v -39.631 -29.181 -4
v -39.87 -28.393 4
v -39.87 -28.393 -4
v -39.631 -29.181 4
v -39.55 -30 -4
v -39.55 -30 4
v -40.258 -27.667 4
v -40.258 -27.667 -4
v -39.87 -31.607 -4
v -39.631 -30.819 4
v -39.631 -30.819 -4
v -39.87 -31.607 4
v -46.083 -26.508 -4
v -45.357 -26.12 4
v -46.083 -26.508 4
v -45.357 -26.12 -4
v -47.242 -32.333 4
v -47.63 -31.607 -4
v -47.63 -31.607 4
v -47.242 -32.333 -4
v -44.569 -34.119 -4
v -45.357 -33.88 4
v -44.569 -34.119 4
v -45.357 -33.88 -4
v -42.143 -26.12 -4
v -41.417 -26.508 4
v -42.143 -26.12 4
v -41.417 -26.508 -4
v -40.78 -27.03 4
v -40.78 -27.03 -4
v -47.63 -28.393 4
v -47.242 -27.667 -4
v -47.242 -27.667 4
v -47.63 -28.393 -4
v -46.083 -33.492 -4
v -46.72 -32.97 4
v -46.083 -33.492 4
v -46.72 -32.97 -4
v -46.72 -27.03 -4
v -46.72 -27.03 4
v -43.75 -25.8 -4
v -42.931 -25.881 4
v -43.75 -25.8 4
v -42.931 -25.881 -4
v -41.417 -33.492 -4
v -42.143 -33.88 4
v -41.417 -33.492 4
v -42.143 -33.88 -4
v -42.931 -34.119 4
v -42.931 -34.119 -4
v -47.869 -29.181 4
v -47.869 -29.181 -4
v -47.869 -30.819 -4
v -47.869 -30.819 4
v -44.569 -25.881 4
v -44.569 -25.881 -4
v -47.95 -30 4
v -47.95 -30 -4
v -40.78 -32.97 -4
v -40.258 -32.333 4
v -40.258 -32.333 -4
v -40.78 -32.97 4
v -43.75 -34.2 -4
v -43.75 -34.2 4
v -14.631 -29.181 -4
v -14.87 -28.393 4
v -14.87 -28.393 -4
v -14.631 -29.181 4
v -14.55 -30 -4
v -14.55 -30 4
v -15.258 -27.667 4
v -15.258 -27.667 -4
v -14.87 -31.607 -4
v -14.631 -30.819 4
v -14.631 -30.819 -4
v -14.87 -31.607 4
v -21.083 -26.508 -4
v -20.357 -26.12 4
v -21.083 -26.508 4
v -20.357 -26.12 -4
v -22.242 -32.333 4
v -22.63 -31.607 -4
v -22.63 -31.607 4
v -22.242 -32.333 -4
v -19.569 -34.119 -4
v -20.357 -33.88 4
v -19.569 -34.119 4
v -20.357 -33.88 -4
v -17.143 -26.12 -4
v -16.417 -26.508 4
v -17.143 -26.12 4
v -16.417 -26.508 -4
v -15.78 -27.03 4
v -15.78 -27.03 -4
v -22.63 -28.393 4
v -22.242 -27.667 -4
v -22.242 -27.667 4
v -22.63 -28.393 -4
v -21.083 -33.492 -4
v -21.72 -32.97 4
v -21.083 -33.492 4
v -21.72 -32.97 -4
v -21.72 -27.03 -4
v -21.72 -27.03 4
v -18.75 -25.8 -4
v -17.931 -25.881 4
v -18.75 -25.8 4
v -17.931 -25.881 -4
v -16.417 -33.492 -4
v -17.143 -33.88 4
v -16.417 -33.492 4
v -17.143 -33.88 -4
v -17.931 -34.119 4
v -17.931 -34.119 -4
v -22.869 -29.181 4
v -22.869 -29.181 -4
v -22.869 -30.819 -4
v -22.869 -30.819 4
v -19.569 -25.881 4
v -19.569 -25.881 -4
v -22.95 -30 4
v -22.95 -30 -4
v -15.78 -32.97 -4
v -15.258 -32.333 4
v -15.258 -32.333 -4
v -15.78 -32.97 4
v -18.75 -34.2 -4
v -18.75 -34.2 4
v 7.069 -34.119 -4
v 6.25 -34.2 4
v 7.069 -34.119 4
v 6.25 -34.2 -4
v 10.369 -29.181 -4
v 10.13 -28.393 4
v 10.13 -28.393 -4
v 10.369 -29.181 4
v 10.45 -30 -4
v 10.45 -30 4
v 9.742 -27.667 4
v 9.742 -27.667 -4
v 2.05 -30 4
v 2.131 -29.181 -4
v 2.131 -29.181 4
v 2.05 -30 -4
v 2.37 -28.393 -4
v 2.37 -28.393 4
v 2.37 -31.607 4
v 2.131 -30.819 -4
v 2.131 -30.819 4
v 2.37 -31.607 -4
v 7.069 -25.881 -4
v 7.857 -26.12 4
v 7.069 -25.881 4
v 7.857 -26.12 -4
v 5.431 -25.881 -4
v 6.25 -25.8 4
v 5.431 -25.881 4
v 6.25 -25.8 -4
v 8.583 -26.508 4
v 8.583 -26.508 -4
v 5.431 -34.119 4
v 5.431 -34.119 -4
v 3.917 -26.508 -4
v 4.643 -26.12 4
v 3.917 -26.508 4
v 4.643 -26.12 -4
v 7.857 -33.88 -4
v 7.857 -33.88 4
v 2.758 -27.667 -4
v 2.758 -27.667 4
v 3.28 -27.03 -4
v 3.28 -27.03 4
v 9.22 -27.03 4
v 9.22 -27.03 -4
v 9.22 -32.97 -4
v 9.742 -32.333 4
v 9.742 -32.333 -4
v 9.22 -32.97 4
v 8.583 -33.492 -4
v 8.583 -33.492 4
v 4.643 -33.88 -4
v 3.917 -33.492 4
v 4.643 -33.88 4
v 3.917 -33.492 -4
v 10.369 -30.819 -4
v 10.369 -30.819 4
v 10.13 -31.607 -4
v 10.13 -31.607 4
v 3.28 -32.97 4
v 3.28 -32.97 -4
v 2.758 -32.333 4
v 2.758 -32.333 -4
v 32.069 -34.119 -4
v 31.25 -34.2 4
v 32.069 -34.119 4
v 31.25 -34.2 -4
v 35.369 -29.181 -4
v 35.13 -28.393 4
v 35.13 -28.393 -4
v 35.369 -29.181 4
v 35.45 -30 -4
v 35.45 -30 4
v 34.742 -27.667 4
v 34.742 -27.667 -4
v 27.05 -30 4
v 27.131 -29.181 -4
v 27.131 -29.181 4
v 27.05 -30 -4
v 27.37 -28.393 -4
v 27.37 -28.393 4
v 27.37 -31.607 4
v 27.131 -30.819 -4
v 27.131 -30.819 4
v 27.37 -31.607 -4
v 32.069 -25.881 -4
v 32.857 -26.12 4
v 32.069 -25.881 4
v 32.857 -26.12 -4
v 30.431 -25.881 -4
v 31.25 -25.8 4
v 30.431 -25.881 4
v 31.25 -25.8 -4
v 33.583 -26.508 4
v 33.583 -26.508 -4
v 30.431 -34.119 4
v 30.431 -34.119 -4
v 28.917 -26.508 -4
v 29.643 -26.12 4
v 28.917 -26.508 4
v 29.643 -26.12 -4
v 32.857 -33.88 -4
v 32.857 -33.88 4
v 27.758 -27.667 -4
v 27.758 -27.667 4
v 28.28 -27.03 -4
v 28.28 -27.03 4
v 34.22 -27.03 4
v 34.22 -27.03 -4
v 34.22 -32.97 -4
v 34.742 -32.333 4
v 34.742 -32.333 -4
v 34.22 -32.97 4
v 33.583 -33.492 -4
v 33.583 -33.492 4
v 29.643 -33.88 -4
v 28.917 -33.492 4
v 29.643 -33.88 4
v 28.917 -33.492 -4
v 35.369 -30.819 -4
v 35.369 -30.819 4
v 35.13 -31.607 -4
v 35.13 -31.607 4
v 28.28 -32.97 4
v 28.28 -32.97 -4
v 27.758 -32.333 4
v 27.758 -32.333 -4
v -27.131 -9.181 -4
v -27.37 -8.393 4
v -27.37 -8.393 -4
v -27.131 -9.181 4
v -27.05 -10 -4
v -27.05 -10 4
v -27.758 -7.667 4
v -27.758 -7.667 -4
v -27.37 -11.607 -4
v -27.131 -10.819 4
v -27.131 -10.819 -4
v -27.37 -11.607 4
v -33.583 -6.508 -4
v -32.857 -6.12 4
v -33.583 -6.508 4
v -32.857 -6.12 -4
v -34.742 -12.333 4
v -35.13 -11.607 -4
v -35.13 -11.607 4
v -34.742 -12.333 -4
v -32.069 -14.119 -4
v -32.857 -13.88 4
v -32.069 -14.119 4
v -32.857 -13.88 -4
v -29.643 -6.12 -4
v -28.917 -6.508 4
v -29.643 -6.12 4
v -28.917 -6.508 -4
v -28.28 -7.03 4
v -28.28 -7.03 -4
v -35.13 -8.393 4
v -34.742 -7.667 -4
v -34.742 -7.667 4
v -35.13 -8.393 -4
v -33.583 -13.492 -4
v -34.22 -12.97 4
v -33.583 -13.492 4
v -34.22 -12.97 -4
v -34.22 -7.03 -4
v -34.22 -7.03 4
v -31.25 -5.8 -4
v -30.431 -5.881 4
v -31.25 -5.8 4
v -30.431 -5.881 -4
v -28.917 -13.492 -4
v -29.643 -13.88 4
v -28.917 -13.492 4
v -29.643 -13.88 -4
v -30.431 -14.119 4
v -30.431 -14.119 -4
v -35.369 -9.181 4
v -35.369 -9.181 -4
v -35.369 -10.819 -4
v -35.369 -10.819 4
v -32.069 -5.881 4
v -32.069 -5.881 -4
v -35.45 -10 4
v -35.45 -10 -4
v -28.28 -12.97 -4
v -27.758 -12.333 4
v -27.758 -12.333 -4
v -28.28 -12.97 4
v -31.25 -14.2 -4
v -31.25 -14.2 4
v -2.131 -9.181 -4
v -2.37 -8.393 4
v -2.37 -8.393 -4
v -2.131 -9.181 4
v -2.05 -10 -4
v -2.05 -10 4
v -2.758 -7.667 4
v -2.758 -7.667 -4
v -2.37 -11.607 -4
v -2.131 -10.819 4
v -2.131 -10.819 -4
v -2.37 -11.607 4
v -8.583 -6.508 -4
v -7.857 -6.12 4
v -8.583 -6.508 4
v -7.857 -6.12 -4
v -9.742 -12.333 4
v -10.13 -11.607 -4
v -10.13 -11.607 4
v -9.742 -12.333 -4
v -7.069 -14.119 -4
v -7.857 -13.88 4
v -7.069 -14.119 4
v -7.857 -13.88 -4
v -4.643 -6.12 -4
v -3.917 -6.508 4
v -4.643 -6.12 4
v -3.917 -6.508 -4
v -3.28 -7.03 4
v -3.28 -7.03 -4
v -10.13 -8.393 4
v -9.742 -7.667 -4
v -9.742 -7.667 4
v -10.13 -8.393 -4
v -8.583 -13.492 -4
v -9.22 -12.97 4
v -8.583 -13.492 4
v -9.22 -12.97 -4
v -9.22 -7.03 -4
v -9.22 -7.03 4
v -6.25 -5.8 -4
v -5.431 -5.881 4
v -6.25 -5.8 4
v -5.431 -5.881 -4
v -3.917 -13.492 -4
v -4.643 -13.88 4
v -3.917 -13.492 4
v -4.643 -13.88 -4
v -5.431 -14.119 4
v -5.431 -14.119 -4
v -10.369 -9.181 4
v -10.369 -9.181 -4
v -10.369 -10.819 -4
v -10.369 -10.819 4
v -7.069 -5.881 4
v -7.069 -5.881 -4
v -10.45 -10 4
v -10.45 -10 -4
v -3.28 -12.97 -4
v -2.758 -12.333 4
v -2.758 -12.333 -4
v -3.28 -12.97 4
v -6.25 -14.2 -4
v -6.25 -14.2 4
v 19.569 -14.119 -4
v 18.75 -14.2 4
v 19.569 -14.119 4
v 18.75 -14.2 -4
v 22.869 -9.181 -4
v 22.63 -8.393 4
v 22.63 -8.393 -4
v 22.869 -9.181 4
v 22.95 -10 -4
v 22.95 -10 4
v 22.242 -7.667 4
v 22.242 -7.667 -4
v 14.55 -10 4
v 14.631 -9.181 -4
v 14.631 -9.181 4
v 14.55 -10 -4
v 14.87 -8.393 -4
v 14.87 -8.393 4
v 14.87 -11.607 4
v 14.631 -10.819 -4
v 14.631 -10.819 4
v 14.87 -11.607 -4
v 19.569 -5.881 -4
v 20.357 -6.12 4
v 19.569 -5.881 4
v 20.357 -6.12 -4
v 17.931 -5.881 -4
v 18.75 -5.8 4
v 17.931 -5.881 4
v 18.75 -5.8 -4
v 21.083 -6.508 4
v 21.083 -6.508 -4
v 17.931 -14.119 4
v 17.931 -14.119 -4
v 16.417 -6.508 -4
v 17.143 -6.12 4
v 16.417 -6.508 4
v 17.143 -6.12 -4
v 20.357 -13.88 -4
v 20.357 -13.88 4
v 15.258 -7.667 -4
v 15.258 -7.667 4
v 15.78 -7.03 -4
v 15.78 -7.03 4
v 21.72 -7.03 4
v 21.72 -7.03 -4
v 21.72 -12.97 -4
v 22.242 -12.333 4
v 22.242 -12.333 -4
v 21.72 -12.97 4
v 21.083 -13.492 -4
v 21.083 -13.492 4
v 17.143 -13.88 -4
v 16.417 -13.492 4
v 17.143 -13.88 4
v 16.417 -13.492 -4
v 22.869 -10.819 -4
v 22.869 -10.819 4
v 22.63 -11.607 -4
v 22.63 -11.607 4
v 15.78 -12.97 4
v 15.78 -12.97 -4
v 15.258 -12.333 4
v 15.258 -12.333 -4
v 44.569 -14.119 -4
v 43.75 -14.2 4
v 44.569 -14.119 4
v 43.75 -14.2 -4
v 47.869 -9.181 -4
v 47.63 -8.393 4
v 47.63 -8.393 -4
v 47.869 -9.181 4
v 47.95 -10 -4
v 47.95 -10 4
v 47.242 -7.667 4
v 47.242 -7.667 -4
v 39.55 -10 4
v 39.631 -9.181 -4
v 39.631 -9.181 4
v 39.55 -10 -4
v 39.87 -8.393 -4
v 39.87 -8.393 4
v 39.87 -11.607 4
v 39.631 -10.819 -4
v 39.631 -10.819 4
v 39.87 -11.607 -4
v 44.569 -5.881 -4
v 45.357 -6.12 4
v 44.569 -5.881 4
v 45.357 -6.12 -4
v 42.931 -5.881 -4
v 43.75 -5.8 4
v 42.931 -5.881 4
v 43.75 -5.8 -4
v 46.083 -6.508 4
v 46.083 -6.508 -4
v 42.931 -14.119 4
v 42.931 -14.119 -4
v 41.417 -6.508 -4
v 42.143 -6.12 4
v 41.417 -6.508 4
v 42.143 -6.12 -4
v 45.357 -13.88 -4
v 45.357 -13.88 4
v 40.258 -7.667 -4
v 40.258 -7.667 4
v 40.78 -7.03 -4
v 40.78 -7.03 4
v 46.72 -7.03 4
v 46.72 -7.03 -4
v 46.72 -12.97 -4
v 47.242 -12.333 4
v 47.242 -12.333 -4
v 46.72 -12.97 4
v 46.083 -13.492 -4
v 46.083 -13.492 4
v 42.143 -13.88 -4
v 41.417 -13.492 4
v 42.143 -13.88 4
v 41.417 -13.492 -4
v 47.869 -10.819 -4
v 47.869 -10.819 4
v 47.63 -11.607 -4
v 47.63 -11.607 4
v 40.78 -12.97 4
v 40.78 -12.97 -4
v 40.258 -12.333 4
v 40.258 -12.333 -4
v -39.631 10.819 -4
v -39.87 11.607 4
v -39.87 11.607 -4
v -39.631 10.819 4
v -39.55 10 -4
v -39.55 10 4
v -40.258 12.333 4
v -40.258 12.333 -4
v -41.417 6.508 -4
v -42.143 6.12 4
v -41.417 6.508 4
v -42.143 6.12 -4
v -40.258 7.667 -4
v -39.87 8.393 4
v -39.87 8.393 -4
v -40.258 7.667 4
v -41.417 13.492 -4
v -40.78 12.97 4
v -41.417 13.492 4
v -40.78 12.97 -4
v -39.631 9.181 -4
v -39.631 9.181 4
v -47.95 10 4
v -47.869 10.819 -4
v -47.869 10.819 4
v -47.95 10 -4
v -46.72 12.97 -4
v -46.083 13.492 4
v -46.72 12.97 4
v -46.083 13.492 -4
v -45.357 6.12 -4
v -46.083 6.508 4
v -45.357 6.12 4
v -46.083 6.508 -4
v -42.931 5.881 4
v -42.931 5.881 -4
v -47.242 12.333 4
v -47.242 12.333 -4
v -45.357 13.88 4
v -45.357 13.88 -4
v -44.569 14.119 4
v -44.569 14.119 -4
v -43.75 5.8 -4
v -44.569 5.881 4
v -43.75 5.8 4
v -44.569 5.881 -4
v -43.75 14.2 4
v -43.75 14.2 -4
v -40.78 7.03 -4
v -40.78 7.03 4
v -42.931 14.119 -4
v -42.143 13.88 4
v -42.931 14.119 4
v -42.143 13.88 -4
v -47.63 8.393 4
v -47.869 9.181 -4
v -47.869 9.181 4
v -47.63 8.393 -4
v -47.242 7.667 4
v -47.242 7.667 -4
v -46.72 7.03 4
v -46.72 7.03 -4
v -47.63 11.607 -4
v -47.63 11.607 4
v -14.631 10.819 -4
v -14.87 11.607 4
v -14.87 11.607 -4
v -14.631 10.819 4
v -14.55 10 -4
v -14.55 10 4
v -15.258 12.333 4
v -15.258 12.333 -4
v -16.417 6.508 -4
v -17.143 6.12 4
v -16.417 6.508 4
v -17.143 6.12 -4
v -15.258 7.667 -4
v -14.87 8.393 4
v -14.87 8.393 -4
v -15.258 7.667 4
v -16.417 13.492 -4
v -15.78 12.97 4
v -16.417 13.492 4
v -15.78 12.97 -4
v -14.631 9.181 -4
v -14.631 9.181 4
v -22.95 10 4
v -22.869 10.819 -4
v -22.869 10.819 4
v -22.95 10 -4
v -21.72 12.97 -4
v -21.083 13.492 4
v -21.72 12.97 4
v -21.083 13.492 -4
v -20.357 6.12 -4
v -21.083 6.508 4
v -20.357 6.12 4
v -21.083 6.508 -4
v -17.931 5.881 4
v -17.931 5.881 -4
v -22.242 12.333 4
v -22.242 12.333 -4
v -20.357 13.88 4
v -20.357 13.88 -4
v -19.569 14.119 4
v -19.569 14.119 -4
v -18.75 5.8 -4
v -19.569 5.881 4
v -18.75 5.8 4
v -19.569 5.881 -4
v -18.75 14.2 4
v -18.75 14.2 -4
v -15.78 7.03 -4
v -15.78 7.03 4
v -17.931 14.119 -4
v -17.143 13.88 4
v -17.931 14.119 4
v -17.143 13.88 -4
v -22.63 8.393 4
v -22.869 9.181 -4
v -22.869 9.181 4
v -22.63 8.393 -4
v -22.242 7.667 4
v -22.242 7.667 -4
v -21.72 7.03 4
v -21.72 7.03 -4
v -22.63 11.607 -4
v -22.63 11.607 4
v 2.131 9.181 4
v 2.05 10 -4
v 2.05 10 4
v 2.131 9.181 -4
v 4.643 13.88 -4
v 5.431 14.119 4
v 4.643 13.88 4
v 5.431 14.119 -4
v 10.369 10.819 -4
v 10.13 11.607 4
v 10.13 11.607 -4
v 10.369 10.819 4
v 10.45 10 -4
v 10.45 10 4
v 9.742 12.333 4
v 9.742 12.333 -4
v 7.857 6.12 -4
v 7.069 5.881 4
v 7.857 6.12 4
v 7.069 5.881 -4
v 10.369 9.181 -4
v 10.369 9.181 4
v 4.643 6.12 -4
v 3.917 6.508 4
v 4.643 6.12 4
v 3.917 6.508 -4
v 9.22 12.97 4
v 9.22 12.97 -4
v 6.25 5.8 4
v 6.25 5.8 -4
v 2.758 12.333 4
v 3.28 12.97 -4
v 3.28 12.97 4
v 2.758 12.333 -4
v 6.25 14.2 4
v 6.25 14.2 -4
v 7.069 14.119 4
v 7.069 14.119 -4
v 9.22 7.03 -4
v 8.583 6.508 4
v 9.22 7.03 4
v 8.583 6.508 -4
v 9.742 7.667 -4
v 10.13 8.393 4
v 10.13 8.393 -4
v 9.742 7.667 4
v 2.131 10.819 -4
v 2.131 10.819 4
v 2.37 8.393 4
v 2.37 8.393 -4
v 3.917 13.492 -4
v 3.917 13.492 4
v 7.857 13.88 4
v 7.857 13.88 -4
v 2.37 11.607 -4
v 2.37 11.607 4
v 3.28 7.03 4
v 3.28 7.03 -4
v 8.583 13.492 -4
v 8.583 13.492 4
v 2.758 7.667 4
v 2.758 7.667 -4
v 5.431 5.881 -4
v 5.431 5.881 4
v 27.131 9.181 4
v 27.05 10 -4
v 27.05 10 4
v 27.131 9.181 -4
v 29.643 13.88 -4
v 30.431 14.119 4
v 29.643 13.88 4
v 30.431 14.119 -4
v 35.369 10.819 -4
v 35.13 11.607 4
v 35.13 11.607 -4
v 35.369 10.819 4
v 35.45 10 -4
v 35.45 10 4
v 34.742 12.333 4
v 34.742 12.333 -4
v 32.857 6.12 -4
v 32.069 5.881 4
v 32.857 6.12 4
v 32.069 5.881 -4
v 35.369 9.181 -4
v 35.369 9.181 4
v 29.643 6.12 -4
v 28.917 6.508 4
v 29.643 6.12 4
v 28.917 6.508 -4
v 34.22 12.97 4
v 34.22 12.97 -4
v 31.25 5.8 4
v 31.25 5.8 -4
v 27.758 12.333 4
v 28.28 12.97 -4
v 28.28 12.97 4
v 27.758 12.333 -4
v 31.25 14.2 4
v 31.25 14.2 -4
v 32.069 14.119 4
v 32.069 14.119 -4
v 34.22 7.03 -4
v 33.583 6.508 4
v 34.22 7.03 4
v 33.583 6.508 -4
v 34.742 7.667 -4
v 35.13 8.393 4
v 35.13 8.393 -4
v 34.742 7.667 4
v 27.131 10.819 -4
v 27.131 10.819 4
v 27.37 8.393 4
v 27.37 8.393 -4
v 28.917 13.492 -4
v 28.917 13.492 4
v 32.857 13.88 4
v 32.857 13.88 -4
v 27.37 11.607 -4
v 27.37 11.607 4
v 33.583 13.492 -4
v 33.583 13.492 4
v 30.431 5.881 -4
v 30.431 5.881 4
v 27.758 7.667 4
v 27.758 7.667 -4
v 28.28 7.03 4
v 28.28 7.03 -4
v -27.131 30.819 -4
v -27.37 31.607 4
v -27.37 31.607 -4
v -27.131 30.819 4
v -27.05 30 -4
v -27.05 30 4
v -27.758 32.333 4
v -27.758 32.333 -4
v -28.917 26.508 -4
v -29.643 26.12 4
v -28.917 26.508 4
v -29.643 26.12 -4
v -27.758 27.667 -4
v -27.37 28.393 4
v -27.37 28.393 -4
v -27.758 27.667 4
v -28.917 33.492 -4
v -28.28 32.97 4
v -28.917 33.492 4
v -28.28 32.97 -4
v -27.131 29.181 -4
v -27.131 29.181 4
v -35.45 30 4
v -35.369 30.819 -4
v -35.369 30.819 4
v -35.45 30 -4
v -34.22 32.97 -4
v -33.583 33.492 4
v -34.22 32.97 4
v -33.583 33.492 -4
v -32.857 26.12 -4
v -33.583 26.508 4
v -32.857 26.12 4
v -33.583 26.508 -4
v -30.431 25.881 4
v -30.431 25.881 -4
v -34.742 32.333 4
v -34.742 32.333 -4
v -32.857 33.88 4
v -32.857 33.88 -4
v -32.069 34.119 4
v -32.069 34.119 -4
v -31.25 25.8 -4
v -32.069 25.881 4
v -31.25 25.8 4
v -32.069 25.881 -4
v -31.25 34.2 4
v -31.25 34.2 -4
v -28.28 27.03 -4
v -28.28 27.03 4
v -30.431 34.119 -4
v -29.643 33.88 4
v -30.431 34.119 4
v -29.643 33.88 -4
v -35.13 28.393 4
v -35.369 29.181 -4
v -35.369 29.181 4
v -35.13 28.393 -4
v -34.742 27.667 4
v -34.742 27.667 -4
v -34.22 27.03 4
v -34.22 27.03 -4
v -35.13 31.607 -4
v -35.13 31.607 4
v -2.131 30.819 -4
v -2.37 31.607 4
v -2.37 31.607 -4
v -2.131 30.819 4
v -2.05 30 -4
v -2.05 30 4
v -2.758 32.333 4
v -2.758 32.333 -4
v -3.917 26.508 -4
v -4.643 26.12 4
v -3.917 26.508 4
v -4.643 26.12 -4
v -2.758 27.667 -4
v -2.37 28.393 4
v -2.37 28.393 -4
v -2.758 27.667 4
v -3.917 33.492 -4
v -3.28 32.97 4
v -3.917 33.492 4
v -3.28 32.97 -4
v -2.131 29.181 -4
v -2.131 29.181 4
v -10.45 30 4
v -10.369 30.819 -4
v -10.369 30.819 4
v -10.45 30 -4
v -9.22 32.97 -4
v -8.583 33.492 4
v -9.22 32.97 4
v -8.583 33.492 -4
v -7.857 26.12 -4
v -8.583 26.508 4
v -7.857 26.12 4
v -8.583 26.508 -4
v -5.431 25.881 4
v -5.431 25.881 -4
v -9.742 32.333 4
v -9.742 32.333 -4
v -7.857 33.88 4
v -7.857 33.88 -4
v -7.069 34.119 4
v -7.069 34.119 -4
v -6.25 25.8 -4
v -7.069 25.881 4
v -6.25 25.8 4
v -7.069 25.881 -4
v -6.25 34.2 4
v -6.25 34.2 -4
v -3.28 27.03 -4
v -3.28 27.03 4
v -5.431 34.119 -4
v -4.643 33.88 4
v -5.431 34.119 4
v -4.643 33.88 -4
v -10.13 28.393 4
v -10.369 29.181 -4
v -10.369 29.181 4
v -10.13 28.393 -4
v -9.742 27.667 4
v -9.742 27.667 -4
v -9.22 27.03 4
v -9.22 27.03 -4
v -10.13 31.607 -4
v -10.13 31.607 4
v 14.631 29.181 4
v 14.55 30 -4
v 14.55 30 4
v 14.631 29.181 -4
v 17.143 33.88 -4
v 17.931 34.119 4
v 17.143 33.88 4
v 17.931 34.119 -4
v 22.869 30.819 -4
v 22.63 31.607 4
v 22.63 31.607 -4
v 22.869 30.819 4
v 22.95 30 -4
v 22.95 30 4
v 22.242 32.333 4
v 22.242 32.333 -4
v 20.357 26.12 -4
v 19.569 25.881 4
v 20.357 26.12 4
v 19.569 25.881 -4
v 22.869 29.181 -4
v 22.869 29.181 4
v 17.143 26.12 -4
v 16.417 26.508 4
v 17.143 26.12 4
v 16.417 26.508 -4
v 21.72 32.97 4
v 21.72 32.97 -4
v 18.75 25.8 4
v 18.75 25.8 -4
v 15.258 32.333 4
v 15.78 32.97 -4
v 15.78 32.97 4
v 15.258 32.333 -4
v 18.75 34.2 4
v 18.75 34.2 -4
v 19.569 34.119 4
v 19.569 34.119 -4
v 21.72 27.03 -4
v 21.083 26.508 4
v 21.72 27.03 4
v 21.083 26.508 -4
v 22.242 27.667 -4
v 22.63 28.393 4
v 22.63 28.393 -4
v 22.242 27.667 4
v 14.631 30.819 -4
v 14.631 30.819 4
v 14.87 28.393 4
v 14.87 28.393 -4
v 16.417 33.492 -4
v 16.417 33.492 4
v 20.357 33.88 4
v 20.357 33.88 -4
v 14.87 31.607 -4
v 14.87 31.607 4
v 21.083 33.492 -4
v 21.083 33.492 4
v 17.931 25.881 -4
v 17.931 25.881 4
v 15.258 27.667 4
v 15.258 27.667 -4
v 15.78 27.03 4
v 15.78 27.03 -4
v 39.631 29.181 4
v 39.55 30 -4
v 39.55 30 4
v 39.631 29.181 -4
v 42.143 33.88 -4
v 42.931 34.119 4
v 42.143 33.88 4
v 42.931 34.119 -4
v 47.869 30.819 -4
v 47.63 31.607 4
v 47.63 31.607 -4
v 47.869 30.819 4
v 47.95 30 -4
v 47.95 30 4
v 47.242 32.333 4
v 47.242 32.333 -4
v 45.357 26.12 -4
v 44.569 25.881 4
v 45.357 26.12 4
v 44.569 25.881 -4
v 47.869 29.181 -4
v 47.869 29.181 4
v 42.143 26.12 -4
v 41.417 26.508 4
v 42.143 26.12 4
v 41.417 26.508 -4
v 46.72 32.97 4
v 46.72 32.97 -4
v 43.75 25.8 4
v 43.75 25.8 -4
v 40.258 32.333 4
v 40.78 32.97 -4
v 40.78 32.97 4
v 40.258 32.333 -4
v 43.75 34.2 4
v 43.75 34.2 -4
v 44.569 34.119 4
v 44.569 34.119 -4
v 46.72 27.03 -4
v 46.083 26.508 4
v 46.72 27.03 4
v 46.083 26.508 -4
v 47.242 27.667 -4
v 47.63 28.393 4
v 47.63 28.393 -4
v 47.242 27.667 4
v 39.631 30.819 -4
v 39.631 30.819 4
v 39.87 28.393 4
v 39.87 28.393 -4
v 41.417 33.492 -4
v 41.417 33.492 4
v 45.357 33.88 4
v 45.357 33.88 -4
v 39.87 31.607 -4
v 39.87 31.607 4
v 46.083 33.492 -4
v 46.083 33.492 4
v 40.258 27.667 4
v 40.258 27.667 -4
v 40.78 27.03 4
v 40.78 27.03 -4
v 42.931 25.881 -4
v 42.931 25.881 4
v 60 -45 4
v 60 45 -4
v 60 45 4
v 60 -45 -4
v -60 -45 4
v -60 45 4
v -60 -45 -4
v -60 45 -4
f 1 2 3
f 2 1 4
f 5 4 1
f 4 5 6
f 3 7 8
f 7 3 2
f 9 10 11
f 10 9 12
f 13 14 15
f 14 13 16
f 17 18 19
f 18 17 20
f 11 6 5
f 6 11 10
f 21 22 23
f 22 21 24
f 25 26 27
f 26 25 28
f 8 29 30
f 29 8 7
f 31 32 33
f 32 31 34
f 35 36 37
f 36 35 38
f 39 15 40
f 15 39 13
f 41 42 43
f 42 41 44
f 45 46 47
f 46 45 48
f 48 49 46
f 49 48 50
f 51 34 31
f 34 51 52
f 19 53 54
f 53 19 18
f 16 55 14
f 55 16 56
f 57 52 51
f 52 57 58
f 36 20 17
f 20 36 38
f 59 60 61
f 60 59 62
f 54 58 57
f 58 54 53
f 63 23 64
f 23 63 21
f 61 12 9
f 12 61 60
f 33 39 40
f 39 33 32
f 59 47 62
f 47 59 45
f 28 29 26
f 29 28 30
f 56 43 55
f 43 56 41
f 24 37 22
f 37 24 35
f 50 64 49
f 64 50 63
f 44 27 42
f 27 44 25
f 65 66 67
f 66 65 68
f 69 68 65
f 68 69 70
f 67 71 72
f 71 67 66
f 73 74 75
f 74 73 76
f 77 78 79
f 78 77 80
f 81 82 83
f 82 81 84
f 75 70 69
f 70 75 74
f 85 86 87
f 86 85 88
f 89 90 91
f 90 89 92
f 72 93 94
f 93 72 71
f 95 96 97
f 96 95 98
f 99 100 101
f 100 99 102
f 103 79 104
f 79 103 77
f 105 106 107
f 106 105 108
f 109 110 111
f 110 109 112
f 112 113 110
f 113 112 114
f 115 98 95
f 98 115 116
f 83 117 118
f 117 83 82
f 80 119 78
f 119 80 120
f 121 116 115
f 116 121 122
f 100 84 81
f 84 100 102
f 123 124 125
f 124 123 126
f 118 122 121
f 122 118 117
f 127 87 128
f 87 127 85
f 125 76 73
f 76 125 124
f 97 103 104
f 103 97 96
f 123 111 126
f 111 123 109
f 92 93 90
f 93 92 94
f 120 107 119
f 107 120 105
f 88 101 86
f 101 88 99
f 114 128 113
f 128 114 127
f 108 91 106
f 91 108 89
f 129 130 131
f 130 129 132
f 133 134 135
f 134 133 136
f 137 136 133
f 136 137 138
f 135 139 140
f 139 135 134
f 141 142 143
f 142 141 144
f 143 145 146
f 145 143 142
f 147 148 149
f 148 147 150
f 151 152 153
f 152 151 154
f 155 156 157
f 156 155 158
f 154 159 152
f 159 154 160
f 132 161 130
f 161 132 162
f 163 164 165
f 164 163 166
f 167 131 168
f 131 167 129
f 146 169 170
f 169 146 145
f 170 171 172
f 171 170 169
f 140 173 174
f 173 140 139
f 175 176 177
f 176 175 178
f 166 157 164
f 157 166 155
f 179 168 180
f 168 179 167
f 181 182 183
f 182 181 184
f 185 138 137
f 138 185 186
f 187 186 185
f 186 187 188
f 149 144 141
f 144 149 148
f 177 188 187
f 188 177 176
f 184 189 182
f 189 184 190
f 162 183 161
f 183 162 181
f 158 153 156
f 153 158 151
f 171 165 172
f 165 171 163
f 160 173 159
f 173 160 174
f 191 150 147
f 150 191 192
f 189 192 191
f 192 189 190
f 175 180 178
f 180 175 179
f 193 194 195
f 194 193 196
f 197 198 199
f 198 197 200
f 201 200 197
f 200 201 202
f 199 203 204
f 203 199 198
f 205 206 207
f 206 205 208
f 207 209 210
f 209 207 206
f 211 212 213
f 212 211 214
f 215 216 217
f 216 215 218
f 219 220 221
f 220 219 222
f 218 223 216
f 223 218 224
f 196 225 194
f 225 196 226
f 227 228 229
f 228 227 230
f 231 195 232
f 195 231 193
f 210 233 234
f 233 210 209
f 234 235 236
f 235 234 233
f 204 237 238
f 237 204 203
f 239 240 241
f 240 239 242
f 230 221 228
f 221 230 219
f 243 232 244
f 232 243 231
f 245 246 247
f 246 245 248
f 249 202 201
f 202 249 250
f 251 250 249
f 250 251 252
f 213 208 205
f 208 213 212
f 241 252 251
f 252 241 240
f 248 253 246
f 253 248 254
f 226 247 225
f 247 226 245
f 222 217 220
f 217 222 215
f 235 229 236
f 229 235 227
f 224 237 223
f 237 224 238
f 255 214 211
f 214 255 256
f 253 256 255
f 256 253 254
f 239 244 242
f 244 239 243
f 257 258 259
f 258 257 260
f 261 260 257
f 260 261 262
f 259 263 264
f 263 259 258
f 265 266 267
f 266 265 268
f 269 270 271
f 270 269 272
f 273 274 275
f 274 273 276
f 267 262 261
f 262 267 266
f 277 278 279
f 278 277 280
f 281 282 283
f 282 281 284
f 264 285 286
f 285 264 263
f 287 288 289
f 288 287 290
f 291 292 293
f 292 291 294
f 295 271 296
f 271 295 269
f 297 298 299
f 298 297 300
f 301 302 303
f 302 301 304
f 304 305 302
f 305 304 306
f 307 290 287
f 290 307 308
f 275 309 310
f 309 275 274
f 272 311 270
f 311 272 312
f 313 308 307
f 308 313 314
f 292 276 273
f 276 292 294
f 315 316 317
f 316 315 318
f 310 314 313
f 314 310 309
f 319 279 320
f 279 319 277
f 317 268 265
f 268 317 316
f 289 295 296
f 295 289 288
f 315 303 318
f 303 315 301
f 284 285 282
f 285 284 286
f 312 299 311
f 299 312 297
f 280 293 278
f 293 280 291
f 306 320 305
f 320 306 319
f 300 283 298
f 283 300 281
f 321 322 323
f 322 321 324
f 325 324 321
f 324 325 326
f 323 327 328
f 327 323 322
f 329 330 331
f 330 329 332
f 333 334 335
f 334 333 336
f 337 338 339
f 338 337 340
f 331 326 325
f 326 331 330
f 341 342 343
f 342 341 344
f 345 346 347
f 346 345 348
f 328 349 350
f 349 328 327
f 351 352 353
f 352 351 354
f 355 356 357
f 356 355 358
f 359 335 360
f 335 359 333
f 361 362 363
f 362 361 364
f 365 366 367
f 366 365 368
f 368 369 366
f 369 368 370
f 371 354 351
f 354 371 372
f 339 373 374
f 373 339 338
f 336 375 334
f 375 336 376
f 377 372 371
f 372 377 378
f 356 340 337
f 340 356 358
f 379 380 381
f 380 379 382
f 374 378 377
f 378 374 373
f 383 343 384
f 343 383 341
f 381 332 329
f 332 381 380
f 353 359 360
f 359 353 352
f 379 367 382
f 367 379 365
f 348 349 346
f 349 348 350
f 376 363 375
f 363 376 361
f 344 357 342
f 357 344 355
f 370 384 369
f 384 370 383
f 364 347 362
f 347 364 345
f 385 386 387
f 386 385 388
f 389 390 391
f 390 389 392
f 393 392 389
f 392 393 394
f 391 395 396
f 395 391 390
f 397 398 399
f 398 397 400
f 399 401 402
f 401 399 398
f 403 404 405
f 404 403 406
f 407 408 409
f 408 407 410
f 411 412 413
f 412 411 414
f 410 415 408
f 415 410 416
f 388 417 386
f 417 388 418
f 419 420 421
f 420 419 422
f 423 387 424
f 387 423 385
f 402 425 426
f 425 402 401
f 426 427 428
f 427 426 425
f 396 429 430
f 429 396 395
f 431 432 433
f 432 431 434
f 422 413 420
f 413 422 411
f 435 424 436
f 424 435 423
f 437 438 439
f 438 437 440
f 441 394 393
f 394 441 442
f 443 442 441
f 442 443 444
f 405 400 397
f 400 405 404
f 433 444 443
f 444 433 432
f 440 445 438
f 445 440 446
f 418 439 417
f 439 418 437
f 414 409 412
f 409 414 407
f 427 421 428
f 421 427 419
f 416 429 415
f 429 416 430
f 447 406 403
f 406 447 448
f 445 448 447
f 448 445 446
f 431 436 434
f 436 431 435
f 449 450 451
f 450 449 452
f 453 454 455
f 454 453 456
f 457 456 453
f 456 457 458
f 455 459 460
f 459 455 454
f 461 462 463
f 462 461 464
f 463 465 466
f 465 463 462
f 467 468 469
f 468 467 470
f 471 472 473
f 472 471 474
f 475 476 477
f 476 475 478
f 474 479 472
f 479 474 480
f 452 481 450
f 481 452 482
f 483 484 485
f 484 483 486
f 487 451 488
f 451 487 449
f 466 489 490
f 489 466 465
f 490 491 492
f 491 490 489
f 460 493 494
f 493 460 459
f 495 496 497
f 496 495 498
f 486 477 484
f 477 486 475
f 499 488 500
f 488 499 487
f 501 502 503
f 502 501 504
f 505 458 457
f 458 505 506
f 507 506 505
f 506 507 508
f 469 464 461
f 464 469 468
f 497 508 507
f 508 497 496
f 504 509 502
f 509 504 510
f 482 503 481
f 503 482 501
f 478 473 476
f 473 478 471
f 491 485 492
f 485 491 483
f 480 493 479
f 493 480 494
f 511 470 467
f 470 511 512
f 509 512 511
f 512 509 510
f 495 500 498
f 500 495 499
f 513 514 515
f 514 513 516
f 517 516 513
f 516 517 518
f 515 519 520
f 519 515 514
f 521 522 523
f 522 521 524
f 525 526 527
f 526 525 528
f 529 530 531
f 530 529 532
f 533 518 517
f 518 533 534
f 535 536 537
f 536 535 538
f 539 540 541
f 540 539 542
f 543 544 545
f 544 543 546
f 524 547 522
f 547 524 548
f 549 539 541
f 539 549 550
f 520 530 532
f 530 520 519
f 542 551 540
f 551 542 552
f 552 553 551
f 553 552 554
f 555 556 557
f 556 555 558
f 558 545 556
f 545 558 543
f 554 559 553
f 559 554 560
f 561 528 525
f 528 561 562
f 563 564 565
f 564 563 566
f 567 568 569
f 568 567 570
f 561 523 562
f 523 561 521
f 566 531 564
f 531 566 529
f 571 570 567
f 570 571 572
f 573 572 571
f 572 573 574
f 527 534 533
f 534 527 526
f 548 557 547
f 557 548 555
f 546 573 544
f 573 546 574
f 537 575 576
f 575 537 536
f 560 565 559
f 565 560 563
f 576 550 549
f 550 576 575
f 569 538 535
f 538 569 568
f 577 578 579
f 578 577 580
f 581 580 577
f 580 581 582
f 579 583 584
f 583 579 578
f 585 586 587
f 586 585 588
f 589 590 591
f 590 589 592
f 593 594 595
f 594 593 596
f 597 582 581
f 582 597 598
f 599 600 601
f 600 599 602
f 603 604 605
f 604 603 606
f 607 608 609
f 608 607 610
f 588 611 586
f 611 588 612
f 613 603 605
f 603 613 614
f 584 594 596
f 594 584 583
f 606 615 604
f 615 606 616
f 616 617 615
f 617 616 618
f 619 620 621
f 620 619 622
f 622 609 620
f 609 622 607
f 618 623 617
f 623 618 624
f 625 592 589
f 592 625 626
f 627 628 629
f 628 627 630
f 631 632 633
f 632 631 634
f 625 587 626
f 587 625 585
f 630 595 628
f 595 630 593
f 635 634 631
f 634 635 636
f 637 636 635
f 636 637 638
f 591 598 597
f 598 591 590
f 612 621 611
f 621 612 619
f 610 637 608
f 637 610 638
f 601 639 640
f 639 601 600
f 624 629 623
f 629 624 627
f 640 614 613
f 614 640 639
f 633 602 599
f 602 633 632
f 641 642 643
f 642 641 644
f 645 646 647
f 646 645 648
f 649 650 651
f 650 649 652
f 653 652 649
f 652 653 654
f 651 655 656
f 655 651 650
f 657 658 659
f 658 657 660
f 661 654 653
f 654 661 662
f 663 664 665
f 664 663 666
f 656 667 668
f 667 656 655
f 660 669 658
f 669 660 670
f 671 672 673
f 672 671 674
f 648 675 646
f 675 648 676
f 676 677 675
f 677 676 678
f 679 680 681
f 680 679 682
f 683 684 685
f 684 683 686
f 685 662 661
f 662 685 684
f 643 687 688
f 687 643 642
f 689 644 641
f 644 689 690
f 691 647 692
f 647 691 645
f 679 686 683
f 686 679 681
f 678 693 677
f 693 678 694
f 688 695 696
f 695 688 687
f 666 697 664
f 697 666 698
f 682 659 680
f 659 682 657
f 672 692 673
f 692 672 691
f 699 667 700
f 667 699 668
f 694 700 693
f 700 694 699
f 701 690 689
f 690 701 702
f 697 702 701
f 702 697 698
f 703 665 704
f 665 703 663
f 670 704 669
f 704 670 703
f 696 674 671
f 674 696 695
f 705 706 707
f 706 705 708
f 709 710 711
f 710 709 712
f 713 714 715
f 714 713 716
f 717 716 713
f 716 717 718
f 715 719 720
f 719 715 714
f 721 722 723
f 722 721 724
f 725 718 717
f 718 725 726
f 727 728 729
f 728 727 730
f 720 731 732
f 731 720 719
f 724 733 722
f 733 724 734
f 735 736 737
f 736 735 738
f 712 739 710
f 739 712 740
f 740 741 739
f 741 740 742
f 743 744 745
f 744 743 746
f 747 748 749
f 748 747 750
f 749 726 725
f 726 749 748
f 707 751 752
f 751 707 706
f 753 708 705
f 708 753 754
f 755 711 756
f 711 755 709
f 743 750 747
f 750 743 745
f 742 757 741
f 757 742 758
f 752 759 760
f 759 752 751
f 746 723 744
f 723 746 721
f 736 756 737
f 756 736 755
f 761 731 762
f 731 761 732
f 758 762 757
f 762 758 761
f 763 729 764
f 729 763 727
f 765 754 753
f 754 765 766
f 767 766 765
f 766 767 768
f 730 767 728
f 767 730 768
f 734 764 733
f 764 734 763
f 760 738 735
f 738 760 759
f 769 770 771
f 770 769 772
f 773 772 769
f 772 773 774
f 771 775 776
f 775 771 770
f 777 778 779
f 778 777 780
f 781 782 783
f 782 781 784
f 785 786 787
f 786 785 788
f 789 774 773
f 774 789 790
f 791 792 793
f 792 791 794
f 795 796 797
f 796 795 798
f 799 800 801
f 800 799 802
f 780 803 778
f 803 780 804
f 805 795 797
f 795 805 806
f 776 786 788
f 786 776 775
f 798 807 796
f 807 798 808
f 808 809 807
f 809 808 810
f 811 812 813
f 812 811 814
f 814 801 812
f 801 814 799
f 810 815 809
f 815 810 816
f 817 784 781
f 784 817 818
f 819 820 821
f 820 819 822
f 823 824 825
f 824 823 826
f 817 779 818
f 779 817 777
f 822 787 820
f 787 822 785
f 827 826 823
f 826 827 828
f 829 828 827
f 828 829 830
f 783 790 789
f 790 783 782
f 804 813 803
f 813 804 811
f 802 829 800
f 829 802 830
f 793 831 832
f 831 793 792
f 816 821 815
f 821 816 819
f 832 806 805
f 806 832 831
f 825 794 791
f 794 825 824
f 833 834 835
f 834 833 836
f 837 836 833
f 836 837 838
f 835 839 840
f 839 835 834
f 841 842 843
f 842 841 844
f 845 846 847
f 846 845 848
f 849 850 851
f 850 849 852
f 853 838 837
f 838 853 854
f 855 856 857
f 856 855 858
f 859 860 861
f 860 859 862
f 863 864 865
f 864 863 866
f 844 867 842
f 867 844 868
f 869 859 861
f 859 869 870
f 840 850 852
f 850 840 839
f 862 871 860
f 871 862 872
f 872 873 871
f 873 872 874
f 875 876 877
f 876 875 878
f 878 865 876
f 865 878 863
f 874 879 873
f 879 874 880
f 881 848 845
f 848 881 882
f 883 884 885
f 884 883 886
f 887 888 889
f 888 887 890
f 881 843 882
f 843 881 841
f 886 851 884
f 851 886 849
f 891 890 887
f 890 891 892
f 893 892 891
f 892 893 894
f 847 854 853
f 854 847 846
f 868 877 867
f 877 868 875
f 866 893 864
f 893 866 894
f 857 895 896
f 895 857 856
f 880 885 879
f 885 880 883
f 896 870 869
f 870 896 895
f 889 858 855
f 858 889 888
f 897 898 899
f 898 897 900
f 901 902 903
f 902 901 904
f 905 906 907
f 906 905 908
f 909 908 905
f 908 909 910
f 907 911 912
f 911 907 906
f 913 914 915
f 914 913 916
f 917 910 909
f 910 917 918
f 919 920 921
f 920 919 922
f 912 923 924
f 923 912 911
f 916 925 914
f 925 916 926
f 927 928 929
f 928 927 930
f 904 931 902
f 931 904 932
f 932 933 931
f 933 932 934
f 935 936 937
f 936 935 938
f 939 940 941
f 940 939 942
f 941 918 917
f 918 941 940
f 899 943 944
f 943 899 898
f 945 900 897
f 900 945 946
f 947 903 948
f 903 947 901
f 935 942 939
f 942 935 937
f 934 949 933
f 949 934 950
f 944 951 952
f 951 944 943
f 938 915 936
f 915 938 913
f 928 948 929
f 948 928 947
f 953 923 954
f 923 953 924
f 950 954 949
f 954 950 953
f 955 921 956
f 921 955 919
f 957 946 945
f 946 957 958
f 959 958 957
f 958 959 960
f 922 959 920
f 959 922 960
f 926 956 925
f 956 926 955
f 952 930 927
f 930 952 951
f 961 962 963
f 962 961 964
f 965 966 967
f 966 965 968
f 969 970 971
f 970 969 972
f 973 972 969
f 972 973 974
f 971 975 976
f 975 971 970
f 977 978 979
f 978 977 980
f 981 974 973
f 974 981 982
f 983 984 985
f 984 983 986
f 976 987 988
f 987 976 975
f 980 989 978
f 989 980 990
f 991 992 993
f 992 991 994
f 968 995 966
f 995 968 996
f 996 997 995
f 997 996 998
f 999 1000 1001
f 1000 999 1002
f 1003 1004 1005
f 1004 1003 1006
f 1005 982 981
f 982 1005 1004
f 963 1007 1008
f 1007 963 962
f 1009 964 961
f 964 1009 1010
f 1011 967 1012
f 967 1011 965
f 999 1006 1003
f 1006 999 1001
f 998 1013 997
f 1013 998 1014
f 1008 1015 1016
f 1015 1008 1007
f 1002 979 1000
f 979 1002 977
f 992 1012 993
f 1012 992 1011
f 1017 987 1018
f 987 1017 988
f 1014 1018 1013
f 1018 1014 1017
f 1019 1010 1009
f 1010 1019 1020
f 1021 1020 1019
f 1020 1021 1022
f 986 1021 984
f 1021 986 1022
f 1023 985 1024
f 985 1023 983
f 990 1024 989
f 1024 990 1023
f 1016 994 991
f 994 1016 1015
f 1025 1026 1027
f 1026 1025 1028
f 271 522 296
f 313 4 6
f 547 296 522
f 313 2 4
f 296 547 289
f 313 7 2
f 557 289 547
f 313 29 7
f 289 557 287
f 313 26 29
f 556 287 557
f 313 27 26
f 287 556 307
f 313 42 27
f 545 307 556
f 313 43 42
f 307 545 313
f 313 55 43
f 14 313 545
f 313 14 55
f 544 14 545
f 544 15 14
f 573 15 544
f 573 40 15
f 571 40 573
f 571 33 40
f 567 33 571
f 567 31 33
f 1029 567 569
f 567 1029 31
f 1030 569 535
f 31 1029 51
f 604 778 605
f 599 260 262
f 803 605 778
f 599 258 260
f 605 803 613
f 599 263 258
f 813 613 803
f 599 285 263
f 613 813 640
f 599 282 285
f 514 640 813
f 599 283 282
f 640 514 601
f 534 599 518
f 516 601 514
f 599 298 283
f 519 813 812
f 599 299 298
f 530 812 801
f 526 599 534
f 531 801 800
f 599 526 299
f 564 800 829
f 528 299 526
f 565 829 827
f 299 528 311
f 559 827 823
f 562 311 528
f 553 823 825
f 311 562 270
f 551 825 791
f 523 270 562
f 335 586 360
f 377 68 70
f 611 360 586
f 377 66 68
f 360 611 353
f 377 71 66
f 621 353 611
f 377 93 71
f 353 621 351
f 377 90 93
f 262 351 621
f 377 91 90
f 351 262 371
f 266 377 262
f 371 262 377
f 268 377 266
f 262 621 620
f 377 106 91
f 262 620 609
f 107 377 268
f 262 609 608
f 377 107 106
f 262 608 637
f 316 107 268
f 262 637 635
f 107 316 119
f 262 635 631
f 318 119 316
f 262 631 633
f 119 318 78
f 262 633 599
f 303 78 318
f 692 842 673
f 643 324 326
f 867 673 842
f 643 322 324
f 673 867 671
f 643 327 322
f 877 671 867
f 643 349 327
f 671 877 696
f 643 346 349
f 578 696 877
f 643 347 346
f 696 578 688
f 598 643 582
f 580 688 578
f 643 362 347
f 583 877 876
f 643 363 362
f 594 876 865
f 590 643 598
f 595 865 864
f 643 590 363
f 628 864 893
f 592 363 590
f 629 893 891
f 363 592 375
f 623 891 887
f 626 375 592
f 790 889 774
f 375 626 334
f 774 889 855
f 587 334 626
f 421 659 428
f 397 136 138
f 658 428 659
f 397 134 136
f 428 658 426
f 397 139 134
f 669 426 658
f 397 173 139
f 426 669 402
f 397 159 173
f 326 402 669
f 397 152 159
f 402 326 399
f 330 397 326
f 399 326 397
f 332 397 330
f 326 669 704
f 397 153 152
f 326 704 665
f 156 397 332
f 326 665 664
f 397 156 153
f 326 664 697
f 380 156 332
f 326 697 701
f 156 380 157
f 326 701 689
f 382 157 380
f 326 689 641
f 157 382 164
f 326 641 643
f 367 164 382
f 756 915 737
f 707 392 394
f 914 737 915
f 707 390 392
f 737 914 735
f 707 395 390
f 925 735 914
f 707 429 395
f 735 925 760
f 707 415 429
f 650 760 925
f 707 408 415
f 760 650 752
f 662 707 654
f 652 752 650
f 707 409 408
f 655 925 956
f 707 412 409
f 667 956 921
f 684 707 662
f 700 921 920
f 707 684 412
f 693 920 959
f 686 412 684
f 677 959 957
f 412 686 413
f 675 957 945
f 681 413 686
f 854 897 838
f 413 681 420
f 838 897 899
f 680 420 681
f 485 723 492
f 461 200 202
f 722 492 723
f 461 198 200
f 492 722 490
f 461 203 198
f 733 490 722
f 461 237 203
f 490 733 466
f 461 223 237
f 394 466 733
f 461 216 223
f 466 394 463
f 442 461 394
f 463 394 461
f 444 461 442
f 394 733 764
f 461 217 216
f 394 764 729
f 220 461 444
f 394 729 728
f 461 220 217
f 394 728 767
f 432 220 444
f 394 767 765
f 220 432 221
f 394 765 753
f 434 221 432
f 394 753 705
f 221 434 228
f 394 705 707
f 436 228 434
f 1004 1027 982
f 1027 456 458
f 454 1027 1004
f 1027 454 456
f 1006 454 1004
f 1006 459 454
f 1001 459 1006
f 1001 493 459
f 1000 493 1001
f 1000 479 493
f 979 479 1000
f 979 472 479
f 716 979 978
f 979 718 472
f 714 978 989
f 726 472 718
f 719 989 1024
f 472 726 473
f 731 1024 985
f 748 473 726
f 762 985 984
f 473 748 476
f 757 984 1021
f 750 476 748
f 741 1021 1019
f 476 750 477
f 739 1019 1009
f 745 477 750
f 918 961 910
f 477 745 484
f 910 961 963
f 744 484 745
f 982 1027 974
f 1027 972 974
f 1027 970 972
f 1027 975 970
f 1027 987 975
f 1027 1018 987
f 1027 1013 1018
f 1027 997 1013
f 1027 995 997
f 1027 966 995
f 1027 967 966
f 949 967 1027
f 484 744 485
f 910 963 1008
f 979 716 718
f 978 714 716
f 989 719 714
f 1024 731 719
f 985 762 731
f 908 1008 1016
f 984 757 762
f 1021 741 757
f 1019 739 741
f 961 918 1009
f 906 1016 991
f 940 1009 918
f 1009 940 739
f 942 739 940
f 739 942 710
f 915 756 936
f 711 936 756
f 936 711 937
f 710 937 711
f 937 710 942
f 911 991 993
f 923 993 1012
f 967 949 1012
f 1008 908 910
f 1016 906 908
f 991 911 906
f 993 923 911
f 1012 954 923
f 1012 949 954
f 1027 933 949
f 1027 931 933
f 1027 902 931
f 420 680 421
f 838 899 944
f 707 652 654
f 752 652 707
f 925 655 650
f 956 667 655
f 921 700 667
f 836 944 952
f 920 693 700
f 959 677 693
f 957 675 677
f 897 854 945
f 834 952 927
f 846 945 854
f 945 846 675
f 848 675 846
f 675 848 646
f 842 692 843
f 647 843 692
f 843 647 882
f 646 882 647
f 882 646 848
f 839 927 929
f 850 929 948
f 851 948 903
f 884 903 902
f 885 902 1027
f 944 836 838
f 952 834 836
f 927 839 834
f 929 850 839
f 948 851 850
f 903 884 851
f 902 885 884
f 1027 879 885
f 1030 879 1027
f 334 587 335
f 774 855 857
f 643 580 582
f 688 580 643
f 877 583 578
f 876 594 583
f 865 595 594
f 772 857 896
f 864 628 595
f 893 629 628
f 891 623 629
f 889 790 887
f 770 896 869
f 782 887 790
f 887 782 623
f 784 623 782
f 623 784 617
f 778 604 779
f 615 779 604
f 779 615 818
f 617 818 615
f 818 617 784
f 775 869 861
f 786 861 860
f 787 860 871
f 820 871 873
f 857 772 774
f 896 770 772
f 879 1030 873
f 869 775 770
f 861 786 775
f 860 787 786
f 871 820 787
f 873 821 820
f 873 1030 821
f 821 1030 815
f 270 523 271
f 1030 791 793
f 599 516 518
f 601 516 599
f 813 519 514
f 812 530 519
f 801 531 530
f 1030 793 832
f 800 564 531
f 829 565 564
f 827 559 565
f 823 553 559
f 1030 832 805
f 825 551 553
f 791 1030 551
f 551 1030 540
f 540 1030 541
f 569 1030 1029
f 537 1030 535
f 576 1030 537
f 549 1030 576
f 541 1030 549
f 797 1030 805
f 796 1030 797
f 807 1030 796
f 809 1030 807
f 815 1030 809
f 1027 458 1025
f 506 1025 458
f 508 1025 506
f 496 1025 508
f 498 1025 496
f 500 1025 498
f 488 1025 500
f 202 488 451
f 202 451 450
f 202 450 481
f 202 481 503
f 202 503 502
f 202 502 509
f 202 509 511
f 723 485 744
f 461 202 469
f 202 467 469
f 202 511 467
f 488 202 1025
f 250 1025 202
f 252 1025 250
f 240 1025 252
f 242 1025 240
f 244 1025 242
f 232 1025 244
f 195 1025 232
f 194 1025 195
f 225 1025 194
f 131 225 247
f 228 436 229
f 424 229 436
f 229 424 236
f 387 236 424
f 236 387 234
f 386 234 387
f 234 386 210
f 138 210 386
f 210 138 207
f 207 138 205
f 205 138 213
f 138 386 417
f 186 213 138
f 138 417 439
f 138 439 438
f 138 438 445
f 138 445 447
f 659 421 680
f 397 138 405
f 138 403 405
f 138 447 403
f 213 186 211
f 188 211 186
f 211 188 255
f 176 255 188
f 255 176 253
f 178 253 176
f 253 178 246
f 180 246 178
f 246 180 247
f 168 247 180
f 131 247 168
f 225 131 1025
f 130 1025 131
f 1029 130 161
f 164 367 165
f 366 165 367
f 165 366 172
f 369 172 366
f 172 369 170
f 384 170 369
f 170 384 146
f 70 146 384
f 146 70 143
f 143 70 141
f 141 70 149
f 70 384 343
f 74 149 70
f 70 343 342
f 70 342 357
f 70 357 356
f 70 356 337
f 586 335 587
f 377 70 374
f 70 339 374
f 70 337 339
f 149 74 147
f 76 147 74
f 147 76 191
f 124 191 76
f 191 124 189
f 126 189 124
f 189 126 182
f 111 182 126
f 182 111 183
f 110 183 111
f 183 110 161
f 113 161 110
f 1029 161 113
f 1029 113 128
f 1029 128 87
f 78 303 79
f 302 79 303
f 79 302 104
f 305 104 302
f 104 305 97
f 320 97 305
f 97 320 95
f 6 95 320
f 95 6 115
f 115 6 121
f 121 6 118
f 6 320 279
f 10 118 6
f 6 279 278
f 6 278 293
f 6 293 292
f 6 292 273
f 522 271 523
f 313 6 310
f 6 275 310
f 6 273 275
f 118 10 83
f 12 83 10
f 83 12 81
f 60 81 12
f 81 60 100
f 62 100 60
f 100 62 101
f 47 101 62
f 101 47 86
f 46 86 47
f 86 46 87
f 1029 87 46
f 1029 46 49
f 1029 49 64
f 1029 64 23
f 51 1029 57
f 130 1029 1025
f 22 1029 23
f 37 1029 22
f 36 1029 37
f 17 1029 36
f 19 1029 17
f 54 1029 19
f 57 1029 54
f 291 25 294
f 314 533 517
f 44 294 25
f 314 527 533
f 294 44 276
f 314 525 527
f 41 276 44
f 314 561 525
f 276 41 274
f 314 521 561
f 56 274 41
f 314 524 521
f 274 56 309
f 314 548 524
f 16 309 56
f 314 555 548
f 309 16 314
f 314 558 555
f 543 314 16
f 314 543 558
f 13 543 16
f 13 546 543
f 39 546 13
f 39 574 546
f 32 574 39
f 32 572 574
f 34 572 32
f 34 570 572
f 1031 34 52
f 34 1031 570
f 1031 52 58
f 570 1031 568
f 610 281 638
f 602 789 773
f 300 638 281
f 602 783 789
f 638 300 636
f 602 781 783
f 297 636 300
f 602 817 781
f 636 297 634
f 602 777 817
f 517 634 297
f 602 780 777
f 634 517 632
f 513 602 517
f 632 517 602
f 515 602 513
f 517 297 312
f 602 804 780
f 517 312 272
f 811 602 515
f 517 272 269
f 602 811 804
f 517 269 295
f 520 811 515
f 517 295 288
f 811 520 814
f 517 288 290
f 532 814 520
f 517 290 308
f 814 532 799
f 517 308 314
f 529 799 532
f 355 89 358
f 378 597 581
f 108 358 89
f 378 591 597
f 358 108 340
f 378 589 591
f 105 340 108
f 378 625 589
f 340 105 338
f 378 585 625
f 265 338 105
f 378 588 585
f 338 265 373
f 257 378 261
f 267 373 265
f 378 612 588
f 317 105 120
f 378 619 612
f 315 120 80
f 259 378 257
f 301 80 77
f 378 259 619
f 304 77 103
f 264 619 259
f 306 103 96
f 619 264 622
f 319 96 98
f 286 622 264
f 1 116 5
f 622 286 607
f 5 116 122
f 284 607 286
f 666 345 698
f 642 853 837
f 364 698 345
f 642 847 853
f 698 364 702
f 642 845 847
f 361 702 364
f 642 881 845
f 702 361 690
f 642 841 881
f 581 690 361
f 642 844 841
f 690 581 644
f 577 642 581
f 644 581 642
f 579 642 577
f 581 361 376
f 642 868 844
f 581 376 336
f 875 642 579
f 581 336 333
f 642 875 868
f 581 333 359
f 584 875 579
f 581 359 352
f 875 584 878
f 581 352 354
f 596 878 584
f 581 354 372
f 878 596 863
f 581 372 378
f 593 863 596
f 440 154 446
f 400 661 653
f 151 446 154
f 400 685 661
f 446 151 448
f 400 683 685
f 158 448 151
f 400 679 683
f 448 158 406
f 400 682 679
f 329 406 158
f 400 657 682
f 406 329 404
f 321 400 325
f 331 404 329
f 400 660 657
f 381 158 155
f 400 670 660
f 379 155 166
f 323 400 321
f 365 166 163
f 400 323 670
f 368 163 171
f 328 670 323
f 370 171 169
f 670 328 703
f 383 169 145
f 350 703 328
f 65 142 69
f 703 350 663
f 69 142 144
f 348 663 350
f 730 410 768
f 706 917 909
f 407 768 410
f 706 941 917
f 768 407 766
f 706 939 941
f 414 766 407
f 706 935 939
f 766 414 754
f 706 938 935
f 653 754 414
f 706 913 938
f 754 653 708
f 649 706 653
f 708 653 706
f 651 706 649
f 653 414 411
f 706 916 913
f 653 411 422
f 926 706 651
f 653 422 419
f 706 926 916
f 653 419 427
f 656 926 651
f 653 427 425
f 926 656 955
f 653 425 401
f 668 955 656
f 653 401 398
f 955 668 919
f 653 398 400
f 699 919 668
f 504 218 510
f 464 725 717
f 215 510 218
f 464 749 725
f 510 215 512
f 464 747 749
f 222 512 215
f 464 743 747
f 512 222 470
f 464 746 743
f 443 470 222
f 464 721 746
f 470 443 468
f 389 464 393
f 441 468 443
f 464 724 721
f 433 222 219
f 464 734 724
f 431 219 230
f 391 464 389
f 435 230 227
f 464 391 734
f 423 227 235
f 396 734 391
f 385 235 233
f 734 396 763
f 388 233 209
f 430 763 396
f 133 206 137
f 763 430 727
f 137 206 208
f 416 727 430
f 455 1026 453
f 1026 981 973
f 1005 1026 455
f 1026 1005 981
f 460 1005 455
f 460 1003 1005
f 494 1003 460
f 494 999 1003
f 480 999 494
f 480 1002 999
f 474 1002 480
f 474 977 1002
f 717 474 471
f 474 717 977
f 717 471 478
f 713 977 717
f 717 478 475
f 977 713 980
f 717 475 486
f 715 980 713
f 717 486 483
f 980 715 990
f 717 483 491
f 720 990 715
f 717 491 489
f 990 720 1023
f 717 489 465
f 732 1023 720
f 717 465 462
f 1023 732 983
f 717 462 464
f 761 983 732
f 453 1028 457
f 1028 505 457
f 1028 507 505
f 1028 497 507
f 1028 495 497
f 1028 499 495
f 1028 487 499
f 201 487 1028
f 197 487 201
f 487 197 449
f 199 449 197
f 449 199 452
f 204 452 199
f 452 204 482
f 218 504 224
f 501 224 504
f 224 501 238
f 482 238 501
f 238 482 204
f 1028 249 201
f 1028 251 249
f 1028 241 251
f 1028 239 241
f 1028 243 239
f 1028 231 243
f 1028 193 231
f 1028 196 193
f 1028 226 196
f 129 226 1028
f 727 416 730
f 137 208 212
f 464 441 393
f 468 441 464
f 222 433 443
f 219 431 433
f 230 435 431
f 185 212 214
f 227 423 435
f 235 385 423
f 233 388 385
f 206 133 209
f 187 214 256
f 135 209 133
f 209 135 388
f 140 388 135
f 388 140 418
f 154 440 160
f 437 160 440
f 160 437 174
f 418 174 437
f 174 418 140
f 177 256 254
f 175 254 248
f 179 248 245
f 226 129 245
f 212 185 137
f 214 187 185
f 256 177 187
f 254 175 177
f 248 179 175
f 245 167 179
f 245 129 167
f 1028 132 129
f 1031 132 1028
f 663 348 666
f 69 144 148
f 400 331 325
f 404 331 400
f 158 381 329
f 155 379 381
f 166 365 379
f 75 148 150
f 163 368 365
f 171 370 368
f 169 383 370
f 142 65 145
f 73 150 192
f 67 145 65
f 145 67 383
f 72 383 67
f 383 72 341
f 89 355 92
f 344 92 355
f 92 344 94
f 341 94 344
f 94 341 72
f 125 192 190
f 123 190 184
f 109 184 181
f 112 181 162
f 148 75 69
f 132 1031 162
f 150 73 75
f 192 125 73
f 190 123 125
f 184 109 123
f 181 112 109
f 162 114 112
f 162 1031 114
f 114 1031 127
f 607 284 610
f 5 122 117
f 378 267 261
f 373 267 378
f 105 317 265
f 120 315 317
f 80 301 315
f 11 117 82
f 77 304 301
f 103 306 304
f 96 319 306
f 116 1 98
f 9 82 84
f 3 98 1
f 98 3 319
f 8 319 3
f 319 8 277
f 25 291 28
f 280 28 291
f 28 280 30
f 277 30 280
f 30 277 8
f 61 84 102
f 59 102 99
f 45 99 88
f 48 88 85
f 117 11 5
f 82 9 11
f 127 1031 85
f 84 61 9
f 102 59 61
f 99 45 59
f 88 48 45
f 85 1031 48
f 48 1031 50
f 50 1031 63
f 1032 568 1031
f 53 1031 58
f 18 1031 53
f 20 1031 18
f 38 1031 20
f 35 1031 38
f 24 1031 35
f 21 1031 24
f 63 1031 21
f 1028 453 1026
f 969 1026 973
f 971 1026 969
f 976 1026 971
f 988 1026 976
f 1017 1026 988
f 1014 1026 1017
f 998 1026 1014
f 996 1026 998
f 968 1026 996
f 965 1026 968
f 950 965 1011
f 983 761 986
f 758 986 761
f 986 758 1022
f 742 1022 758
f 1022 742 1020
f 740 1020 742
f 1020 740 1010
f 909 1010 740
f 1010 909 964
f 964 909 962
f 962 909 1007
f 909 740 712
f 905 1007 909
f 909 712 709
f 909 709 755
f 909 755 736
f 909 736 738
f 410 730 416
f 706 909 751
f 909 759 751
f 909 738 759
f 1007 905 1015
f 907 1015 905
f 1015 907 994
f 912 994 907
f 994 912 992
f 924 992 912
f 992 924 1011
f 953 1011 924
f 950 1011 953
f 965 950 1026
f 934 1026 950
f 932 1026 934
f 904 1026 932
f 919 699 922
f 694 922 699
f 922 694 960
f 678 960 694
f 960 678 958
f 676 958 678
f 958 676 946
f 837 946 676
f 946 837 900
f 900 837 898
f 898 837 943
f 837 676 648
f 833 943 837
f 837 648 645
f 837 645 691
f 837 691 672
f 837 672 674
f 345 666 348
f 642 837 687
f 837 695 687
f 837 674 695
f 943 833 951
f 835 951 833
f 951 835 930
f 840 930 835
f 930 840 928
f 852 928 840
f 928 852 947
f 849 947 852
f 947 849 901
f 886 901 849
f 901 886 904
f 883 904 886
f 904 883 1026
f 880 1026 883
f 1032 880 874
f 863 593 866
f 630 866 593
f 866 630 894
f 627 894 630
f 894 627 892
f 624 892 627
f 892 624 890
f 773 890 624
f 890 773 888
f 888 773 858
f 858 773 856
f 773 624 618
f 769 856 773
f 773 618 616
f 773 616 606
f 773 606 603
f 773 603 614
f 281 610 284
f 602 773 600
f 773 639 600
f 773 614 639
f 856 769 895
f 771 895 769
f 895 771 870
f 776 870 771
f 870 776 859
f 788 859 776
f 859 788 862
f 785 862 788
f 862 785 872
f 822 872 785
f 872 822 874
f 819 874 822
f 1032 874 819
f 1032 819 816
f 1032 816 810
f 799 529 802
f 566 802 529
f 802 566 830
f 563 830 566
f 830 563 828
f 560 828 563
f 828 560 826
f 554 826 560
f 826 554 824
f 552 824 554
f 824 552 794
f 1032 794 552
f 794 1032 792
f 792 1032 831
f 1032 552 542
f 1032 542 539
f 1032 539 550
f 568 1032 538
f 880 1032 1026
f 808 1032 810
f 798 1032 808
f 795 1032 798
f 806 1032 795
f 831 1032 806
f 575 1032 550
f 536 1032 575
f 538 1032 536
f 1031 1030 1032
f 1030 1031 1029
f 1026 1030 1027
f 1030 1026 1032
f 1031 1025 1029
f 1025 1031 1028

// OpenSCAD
$fn = 32;

// ----------------------------------------------------------------------
// Perforated panel 120 x 90 x 8
// 4 x 4 Ø8.4 holes, checker layout
// ----------------------------------------------------------------------

// --- parameters (mm) ---
panel = [120, 90, 8];  // overall size (x, y, z)
hole_d = 8.4;          // hole diameter
pitch_x = 25;          // hole pitch along X
pitch_y = 20;          // hole pitch along Y

// --- derived feature positions (mm) ---
margin = hole_d / 2 + 2;            // = 6.2   clearance from the panel edge
row_offset = pitch_x / 2;           // = 12.5   shift of every other row
cols = floor((panel[0] - 2 * margin - row_offset) / pitch_x) + 1;  // = 4   how many columns fit in X
rows = floor((panel[1] - 2 * margin) / pitch_y) + 1;  // = 4   how many rows fit in Y
span_x = (cols - 1) * pitch_x + row_offset;  // = 87.5   width of the field
span_y = (rows - 1) * pitch_y;      // = 60   height of the field
origin_x = -span_x / 2;             // = -43.75   X of the first hole
origin_y = -span_y / 2;             // = -30   Y of the first row
holes = rows * cols;                // = 16   holes in total
feature_centers = [
  [origin_x + 0 * pitch_x, origin_y + 0 * pitch_y],
  [origin_x + 1 * pitch_x, origin_y + 0 * pitch_y],
  [origin_x + 2 * pitch_x, origin_y + 0 * pitch_y],
  [origin_x + 3 * pitch_x, origin_y + 0 * pitch_y],
  [origin_x + row_offset + 0 * pitch_x, origin_y + 1 * pitch_y],
  [origin_x + row_offset + 1 * pitch_x, origin_y + 1 * pitch_y],
  [origin_x + row_offset + 2 * pitch_x, origin_y + 1 * pitch_y],
  [origin_x + row_offset + 3 * pitch_x, origin_y + 1 * pitch_y],
  [origin_x + 0 * pitch_x, origin_y + 2 * pitch_y],
  [origin_x + 1 * pitch_x, origin_y + 2 * pitch_y],
  [origin_x + 2 * pitch_x, origin_y + 2 * pitch_y],
  [origin_x + 3 * pitch_x, origin_y + 2 * pitch_y],
  [origin_x + row_offset + 0 * pitch_x, origin_y + 3 * pitch_y],
  [origin_x + row_offset + 1 * pitch_x, origin_y + 3 * pitch_y],
  [origin_x + row_offset + 2 * pitch_x, origin_y + 3 * pitch_y],
  [origin_x + row_offset + 3 * pitch_x, origin_y + 3 * pitch_y]
];   // hole centres, used verbatim by the cutter loop

// panel outline, every hole through
difference() {
  cube(panel, center = true);
  for (centre = feature_centers)
    translate([centre[0], centre[1], 0])
      cylinder(d = hole_d, h = panel[2] + 2, center = true);
}
